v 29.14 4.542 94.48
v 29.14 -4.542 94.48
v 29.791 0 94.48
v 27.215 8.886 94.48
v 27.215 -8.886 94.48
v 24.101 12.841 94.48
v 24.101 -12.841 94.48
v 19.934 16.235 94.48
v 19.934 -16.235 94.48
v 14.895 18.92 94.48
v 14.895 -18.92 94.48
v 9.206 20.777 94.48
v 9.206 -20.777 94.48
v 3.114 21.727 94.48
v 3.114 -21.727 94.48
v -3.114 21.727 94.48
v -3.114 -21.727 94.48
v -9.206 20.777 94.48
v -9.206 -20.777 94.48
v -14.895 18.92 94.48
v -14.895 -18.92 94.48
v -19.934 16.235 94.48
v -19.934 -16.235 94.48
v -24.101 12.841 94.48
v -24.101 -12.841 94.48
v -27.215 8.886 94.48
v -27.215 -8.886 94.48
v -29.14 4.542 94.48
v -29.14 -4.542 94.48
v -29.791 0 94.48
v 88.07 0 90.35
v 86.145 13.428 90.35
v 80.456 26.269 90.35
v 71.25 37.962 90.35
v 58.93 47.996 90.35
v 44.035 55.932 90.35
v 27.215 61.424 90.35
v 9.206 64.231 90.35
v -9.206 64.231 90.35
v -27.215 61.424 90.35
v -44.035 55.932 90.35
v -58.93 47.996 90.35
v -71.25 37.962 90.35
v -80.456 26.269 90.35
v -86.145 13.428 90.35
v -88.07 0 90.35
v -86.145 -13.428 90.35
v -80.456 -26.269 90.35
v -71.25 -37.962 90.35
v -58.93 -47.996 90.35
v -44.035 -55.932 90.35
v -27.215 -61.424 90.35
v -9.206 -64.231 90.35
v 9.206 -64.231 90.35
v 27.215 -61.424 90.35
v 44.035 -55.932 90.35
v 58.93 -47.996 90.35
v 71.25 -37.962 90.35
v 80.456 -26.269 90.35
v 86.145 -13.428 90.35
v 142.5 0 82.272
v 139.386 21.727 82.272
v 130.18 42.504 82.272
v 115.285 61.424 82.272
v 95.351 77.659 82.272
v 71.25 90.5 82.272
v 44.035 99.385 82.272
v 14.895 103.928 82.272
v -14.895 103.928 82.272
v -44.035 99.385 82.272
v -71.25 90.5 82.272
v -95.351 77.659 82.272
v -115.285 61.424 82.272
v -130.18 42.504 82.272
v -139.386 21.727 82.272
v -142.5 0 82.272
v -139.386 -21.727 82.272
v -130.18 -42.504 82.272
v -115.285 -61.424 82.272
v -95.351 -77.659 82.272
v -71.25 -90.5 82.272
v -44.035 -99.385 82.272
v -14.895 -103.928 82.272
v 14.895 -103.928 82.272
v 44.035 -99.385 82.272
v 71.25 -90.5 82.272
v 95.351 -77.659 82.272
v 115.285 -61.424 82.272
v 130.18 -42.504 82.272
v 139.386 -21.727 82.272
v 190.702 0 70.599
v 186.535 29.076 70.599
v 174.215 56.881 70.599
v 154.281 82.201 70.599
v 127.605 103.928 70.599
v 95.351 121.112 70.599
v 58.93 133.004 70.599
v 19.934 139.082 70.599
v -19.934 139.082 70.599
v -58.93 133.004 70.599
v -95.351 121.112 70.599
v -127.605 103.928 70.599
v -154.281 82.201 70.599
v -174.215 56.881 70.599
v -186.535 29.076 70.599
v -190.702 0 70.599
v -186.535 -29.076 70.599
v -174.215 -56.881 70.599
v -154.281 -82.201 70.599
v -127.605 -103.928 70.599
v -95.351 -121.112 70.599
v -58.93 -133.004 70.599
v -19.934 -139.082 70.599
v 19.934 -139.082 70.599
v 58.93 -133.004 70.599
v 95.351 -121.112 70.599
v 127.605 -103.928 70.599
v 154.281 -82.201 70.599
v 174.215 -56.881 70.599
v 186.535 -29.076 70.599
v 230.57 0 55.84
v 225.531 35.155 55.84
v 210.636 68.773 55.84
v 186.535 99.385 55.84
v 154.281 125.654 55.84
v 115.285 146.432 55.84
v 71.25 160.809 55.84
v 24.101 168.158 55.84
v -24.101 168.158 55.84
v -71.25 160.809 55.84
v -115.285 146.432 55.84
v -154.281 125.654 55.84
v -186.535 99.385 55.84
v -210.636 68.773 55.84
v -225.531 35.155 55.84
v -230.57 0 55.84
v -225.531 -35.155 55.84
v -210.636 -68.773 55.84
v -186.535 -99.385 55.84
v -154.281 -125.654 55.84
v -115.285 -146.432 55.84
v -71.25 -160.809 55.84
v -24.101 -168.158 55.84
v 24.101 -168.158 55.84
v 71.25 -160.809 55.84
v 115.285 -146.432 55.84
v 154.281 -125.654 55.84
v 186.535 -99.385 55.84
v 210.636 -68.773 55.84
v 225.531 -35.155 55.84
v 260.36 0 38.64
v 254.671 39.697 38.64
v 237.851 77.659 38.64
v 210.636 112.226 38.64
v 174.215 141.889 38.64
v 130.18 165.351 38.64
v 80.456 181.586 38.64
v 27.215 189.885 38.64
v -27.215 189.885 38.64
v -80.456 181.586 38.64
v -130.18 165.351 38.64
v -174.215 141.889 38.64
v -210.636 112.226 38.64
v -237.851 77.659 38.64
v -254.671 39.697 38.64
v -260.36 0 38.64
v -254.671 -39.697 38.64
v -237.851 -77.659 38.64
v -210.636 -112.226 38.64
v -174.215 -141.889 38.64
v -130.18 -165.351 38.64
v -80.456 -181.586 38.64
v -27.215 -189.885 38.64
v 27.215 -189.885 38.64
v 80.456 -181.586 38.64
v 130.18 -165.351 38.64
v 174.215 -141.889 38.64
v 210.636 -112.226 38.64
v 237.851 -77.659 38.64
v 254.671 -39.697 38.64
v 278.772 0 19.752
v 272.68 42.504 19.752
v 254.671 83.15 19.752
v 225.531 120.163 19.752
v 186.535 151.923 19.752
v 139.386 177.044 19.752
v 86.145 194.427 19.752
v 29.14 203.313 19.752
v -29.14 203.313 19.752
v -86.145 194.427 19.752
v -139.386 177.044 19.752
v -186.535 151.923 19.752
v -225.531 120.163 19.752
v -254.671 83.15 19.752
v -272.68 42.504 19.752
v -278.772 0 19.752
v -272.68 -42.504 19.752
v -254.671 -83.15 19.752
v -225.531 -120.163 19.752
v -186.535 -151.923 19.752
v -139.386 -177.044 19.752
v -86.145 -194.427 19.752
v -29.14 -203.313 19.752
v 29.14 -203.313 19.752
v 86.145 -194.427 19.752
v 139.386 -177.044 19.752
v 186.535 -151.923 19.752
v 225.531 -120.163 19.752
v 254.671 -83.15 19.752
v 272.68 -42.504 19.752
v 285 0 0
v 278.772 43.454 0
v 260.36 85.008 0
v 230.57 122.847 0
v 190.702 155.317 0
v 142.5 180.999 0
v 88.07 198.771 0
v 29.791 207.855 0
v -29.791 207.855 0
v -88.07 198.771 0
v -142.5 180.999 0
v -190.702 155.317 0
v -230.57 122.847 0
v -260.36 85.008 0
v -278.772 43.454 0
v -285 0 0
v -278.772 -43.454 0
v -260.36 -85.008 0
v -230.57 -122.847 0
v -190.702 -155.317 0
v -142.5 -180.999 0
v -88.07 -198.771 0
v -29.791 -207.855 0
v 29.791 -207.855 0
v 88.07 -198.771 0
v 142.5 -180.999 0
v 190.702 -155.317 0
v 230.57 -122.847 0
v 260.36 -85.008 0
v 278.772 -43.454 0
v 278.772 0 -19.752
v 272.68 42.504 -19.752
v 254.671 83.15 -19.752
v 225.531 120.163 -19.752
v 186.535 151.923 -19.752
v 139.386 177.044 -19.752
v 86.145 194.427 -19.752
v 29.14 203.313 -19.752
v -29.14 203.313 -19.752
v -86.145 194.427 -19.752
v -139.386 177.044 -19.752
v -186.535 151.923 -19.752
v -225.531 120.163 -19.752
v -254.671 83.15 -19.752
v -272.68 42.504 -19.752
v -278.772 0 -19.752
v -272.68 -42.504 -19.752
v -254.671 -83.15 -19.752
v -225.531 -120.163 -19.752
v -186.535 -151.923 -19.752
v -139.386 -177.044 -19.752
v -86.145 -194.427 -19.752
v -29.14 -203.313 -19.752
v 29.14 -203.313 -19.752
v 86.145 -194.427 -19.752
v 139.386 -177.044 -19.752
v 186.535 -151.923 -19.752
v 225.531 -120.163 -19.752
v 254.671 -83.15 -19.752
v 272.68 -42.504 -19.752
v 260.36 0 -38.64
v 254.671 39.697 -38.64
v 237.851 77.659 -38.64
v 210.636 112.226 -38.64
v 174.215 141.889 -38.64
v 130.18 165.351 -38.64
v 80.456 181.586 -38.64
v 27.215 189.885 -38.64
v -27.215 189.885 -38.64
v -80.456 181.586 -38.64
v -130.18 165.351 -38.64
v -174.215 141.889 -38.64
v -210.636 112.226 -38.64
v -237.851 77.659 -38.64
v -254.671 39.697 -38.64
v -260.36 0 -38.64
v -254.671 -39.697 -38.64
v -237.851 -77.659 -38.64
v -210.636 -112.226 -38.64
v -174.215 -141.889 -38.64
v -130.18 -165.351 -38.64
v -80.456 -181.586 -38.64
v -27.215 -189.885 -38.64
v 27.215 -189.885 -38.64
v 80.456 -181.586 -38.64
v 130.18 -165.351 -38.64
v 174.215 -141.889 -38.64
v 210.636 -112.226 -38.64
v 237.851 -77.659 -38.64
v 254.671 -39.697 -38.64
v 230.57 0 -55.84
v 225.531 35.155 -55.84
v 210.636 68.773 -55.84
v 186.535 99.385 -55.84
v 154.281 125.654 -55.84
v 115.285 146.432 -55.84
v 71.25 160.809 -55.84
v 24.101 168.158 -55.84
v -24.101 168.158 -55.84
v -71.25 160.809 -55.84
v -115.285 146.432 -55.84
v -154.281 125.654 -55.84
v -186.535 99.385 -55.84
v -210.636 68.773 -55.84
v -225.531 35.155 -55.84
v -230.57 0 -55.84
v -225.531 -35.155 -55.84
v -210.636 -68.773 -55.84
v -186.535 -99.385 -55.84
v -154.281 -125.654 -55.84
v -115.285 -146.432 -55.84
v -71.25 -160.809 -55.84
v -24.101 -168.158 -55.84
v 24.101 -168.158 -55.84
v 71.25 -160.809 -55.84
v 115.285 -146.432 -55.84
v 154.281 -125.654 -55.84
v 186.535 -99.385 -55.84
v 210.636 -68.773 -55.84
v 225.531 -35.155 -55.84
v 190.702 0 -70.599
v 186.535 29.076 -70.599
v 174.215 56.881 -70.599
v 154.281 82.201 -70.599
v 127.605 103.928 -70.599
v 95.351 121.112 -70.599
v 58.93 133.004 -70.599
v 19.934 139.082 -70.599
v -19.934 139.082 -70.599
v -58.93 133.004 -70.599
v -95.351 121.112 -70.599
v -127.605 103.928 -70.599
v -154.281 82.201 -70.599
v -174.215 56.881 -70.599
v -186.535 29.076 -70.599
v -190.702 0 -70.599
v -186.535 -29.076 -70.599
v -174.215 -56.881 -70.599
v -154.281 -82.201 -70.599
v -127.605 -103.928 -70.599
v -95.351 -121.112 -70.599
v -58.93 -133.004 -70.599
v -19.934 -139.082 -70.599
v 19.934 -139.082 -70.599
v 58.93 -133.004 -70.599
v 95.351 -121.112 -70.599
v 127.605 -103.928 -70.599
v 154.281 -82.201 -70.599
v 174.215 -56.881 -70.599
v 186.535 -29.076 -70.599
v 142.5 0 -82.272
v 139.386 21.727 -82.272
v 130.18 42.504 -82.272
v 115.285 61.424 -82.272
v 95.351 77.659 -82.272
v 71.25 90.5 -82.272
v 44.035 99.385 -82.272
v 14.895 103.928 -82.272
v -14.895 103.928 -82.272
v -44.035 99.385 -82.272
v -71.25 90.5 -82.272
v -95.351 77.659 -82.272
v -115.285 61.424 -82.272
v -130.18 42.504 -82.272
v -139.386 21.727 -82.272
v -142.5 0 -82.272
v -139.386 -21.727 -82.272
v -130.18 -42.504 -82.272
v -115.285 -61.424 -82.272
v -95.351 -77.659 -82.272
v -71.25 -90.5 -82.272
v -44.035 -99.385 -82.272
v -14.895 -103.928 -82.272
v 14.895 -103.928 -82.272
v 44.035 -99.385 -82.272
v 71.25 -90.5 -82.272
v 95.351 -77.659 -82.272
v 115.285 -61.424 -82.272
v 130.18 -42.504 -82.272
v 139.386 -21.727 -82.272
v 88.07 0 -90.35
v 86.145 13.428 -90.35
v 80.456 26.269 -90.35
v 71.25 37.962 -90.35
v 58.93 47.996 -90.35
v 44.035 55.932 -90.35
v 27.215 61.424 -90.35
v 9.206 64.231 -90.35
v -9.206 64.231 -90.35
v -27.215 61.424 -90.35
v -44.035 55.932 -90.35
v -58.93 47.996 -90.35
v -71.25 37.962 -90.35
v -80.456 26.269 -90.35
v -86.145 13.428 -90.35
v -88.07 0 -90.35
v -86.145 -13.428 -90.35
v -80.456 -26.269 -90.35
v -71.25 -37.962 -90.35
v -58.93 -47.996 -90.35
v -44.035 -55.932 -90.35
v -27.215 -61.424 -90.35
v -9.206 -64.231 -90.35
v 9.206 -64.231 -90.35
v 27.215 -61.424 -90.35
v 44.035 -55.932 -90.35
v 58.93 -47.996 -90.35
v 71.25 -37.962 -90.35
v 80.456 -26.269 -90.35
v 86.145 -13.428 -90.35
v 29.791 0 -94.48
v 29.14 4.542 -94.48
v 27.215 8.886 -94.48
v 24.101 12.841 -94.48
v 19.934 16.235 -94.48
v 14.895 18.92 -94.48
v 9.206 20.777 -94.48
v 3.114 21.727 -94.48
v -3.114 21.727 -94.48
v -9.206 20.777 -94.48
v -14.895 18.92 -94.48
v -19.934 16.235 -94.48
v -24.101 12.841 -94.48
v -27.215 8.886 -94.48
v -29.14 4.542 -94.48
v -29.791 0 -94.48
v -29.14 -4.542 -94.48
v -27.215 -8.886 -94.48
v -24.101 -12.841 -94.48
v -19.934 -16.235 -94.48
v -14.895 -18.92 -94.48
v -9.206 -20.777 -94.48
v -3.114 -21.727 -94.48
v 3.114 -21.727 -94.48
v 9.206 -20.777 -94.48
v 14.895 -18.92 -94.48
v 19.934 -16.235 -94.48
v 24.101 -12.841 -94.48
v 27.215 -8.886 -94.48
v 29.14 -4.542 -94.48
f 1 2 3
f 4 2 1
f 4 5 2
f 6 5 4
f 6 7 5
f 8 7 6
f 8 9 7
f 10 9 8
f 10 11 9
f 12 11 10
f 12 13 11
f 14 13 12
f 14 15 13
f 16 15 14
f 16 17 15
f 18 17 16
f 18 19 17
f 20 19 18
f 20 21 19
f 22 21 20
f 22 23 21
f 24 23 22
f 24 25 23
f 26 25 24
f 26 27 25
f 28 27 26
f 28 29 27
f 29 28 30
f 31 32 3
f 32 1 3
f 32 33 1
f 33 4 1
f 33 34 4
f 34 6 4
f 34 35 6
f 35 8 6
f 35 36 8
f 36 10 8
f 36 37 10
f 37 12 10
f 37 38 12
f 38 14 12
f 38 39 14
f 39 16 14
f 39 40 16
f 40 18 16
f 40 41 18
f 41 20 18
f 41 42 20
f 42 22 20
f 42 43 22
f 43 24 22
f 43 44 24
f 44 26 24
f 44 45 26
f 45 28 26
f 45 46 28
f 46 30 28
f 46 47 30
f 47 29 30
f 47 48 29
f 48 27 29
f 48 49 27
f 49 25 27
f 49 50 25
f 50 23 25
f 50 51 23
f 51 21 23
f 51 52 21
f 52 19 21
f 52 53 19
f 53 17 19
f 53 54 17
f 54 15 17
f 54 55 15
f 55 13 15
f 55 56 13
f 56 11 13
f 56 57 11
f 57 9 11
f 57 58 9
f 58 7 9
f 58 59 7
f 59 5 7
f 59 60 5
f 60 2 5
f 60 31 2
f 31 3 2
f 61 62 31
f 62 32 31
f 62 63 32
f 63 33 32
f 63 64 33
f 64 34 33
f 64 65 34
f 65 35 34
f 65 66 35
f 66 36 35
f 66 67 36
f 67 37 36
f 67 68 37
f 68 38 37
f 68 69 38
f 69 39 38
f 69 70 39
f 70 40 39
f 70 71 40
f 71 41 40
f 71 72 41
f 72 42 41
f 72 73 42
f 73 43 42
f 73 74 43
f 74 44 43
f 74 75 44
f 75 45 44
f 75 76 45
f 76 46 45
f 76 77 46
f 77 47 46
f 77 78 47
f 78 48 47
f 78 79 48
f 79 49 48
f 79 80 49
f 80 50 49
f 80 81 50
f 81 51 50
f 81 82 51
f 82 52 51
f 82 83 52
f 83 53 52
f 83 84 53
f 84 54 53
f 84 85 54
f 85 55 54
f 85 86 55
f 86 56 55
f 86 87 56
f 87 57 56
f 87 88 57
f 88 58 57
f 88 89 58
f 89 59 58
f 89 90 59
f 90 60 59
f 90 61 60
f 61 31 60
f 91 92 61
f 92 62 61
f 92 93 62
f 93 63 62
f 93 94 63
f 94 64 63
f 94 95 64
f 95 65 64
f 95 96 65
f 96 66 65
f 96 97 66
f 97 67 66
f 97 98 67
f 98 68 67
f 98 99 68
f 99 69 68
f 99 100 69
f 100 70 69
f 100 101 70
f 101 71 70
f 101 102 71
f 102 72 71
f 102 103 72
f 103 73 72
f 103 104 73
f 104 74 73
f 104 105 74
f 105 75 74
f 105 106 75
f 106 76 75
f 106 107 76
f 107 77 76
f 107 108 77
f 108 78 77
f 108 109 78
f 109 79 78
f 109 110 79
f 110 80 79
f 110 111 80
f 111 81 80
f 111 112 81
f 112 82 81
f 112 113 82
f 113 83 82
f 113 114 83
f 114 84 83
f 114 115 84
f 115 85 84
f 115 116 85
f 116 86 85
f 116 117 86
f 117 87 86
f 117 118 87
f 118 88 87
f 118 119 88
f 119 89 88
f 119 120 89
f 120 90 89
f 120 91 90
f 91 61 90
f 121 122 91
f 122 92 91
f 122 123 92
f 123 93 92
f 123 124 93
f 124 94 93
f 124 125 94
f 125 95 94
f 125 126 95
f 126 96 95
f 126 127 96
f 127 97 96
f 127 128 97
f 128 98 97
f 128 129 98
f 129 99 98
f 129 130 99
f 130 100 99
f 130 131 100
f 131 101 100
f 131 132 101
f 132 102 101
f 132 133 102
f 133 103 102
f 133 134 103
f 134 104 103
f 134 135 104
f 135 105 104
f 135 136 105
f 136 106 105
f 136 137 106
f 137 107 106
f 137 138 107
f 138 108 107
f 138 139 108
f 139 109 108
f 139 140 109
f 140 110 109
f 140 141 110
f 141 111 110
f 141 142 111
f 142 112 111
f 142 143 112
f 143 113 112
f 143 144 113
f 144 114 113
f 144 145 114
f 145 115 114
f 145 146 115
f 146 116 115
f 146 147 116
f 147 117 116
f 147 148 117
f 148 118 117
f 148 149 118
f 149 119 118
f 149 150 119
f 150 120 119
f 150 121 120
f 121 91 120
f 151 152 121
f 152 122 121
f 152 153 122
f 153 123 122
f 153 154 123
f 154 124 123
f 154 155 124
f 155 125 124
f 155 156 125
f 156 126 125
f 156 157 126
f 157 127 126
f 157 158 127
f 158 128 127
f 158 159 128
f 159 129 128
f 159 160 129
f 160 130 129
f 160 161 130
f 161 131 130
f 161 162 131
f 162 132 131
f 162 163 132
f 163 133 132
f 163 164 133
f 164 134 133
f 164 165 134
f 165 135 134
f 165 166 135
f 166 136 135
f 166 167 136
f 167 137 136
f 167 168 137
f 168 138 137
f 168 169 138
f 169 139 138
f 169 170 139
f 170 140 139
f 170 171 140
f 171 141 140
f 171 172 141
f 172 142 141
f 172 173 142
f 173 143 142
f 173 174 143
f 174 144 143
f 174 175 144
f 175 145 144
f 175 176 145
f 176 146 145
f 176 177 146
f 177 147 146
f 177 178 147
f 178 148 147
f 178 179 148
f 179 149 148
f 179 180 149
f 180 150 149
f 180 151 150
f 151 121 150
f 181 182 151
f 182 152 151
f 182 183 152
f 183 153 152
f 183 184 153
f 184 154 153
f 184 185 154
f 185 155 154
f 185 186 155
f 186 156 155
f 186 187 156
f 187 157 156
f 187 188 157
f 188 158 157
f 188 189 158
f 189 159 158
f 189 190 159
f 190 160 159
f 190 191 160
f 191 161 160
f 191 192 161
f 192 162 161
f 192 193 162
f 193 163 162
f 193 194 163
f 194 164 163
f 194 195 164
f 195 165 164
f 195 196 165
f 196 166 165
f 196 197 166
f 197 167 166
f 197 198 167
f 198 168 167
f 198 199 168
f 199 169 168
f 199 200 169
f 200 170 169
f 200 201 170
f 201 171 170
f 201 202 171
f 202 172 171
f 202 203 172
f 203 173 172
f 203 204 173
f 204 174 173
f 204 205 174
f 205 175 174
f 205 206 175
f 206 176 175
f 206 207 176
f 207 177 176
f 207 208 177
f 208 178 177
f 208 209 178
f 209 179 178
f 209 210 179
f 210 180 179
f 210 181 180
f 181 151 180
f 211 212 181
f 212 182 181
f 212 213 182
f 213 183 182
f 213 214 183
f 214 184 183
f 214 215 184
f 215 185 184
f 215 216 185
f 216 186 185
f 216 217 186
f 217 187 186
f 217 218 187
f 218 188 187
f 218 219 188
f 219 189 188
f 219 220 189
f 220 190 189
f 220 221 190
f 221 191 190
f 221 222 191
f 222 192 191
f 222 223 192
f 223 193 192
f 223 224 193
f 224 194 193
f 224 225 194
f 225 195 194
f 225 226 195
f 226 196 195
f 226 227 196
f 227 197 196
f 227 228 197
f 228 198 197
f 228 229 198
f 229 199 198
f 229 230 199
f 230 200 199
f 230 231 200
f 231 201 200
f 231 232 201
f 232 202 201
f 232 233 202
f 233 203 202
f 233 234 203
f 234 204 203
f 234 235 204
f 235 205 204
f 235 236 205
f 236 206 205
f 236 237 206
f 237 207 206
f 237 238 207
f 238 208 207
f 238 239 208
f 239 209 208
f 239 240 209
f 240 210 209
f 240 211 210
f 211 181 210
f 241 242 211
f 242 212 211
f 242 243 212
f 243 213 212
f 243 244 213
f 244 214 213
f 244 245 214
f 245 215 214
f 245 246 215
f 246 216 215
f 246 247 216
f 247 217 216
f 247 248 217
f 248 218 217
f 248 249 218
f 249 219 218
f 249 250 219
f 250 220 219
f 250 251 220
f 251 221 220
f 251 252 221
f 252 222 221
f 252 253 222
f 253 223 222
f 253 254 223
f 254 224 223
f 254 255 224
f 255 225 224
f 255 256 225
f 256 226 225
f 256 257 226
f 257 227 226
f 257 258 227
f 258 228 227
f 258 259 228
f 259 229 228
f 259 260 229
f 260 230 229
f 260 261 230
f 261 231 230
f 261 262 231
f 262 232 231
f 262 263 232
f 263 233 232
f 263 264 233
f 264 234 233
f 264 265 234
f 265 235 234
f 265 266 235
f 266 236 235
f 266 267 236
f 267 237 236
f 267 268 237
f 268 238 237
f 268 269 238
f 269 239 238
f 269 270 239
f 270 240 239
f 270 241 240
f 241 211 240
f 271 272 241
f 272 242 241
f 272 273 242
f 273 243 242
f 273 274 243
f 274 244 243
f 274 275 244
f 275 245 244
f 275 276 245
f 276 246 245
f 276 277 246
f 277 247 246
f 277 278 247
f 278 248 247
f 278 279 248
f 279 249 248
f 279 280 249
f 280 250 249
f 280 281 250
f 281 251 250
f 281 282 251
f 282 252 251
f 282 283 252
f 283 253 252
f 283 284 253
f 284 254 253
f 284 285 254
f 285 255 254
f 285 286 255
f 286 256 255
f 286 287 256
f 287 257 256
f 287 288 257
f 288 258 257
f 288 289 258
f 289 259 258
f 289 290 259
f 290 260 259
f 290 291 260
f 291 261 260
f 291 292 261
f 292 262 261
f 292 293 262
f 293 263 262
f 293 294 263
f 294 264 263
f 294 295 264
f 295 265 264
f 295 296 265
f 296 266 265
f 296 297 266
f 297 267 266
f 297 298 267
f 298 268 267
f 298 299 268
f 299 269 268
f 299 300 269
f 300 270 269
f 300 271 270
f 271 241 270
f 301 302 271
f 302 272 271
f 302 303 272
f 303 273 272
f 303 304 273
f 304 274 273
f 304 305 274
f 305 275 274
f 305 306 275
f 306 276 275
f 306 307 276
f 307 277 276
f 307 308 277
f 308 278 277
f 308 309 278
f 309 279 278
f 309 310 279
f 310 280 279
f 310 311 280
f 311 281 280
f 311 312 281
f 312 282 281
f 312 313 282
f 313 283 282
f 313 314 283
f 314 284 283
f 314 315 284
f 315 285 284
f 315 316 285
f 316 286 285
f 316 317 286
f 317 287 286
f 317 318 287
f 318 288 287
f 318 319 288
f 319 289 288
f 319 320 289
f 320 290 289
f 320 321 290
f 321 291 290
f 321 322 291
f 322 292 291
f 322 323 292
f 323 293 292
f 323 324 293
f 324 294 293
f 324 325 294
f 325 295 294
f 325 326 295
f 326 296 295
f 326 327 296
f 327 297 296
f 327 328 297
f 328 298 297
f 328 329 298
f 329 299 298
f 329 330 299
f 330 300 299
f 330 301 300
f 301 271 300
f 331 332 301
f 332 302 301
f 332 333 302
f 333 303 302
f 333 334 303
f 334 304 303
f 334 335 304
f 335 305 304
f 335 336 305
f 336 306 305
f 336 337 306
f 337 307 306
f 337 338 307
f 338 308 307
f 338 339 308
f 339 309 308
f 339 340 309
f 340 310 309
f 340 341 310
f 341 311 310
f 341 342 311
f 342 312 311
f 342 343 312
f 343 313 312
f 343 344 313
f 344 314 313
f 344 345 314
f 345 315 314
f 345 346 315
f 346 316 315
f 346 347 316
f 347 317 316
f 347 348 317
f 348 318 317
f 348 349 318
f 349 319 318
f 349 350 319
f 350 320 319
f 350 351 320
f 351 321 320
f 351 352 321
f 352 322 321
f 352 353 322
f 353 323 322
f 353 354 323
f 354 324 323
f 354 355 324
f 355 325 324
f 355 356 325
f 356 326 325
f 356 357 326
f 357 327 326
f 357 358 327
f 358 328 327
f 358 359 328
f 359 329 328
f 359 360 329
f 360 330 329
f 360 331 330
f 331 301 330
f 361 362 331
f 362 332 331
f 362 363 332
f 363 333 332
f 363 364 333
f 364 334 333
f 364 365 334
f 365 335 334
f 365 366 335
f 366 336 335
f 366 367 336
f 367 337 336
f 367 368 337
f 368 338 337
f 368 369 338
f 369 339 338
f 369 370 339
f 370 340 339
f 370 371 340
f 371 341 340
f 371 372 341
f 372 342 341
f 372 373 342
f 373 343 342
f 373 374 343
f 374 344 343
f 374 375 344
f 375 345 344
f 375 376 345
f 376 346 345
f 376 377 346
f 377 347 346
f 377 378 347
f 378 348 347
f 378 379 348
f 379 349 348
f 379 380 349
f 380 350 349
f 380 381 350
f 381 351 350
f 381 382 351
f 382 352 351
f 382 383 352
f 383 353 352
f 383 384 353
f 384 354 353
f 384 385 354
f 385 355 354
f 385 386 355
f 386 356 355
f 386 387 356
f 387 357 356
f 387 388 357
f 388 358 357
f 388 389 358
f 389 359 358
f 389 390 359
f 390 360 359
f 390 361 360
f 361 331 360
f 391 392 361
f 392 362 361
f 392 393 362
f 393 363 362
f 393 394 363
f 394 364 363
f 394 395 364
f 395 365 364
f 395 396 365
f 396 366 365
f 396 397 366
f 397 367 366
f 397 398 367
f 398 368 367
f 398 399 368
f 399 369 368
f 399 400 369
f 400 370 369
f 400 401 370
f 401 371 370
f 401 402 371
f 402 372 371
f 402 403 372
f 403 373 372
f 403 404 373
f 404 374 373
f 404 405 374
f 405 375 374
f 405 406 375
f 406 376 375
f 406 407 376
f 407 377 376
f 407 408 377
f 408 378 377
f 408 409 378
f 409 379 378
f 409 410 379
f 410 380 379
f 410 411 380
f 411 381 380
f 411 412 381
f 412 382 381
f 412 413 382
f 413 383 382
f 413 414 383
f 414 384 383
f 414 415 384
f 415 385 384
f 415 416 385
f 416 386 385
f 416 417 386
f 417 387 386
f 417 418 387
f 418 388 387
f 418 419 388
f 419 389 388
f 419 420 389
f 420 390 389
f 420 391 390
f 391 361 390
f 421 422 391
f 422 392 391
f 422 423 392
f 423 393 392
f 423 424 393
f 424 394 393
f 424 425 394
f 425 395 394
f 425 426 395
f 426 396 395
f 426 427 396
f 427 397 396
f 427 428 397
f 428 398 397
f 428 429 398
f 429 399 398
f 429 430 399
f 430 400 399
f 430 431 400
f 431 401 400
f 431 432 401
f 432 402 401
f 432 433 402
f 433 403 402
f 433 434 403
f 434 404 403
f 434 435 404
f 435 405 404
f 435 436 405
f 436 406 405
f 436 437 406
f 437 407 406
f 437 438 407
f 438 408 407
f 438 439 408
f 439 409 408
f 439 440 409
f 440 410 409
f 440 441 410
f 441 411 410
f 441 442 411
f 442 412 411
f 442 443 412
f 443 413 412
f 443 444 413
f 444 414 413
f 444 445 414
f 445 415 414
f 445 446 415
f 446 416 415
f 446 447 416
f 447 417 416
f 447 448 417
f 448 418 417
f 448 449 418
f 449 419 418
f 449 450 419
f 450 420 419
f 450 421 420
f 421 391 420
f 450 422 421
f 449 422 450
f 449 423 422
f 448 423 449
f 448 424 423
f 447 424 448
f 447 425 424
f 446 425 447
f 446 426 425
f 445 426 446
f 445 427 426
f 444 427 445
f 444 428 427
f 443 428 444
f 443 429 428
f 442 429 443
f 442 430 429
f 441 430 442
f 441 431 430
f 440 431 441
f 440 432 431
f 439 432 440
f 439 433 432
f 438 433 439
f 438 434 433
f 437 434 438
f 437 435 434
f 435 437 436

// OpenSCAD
// Generated by SolidPython 1.0.1 on 2020-07-29 00:46:52


scale(v = [15, 11, 5]) {
	sphere(r = 19);
}
/***********************************************
*********      SolidPython code:      **********
************************************************
 
# import packages: SolidPython
from solid import *
from solid.utils import *
from itertools import chain, combinations, permutations


class Resize:

    def __init__(self, scad_file):
        self.scad_file = scad_file
        #self.scad_file = import_scad(scad_file)
        # cone/cylinder param:
        self.r1 = 0
        self.r2 = 0
        self.h = 0
        # rectangular prism param:
        self.w = 0
        self.l = 0
        # ellipse param:
        self.r = 0

    # import OpenScad code (file name corresponds to shape)


    # classify shape + parameters
    def assign(self, param1, param2, param3):
        if self.scad_file == 'cone.scad':
            self.r1 = param1
            self.r2 = param2
            self.h = param3
        elif self.scad_file == 'cylinder.scad':
            self.r1 = param1
            self.r2 = param2
            self.h = param3
        elif self.scad_file == 'rectangularPrism.scad':
            self.h = param1
            self.l = param2
            self.w = param3
        else:
            self.r = param1
            self.h = param2

    # resize parameters
    def iterate(self):
        x = range(3, 20, 2)
        i = 1
        if self.scad_file == 'cone.scad':
            tempList = list(permutations(x, 2))
            for temp in tempList:
                param1 = temp[0]
                param2 = temp[1]
                filepath = 'produced_scad_files/' + 'cone' + str(param1) + '_' + str(param2) + '_' + '.scad'
                scad_render_to_file(cylinder(h=param1, r1=param2, r2=0), filepath)

        elif self.scad_file == 'cylinder.scad':
            tempList = list(permutations(x, 3))
            for temp in tempList:
                param1 = temp[0]
                param2 = temp[1]
                filepath = 'produced_scad_files/' + 'cylinder' + str(param1) + '_' + str(param2) + '_' + '.scad'
                scad_render_to_file(cylinder(h=param1, r1=param2, r2=param2), filepath)

        elif self.scad_file == 'rectangularPrism.scad':
            tempList = list(permutations(x, 3))
            for temp in tempList:
                param1 = temp[0]
                param2 = temp[1]
                param3 = temp[2]
                filepath = 'produced_scad_files/' + 'rectangularPrism' + str(param1) + '_' + str(param2) + '_' + str(
                    param3) + '.scad'
                scad_render_to_file(cube(size=(param1, param2, param3)), filepath)

        elif self.scad_file == 'ellipse.scad':
            tempList = list(permutations(x, 4))
            for temp in tempList:
                param1 = temp[0]
                param2 = temp[1]
                param3 = temp[2]
                param4 = temp[3]
                filepath = 'produced_scad_files/' + 'ellipse' + str(param1) + '_' + str(param2) + '_' + str(param3) + '_' + str(param4) + '.scad'
                scad_render_to_file(scale([param1, param2, param3])(sphere(r=param4)), filepath)

    def render_to_scadfile(self):
        scad_render_to_file(scad, 'example.scad') 
 
************************************************/
